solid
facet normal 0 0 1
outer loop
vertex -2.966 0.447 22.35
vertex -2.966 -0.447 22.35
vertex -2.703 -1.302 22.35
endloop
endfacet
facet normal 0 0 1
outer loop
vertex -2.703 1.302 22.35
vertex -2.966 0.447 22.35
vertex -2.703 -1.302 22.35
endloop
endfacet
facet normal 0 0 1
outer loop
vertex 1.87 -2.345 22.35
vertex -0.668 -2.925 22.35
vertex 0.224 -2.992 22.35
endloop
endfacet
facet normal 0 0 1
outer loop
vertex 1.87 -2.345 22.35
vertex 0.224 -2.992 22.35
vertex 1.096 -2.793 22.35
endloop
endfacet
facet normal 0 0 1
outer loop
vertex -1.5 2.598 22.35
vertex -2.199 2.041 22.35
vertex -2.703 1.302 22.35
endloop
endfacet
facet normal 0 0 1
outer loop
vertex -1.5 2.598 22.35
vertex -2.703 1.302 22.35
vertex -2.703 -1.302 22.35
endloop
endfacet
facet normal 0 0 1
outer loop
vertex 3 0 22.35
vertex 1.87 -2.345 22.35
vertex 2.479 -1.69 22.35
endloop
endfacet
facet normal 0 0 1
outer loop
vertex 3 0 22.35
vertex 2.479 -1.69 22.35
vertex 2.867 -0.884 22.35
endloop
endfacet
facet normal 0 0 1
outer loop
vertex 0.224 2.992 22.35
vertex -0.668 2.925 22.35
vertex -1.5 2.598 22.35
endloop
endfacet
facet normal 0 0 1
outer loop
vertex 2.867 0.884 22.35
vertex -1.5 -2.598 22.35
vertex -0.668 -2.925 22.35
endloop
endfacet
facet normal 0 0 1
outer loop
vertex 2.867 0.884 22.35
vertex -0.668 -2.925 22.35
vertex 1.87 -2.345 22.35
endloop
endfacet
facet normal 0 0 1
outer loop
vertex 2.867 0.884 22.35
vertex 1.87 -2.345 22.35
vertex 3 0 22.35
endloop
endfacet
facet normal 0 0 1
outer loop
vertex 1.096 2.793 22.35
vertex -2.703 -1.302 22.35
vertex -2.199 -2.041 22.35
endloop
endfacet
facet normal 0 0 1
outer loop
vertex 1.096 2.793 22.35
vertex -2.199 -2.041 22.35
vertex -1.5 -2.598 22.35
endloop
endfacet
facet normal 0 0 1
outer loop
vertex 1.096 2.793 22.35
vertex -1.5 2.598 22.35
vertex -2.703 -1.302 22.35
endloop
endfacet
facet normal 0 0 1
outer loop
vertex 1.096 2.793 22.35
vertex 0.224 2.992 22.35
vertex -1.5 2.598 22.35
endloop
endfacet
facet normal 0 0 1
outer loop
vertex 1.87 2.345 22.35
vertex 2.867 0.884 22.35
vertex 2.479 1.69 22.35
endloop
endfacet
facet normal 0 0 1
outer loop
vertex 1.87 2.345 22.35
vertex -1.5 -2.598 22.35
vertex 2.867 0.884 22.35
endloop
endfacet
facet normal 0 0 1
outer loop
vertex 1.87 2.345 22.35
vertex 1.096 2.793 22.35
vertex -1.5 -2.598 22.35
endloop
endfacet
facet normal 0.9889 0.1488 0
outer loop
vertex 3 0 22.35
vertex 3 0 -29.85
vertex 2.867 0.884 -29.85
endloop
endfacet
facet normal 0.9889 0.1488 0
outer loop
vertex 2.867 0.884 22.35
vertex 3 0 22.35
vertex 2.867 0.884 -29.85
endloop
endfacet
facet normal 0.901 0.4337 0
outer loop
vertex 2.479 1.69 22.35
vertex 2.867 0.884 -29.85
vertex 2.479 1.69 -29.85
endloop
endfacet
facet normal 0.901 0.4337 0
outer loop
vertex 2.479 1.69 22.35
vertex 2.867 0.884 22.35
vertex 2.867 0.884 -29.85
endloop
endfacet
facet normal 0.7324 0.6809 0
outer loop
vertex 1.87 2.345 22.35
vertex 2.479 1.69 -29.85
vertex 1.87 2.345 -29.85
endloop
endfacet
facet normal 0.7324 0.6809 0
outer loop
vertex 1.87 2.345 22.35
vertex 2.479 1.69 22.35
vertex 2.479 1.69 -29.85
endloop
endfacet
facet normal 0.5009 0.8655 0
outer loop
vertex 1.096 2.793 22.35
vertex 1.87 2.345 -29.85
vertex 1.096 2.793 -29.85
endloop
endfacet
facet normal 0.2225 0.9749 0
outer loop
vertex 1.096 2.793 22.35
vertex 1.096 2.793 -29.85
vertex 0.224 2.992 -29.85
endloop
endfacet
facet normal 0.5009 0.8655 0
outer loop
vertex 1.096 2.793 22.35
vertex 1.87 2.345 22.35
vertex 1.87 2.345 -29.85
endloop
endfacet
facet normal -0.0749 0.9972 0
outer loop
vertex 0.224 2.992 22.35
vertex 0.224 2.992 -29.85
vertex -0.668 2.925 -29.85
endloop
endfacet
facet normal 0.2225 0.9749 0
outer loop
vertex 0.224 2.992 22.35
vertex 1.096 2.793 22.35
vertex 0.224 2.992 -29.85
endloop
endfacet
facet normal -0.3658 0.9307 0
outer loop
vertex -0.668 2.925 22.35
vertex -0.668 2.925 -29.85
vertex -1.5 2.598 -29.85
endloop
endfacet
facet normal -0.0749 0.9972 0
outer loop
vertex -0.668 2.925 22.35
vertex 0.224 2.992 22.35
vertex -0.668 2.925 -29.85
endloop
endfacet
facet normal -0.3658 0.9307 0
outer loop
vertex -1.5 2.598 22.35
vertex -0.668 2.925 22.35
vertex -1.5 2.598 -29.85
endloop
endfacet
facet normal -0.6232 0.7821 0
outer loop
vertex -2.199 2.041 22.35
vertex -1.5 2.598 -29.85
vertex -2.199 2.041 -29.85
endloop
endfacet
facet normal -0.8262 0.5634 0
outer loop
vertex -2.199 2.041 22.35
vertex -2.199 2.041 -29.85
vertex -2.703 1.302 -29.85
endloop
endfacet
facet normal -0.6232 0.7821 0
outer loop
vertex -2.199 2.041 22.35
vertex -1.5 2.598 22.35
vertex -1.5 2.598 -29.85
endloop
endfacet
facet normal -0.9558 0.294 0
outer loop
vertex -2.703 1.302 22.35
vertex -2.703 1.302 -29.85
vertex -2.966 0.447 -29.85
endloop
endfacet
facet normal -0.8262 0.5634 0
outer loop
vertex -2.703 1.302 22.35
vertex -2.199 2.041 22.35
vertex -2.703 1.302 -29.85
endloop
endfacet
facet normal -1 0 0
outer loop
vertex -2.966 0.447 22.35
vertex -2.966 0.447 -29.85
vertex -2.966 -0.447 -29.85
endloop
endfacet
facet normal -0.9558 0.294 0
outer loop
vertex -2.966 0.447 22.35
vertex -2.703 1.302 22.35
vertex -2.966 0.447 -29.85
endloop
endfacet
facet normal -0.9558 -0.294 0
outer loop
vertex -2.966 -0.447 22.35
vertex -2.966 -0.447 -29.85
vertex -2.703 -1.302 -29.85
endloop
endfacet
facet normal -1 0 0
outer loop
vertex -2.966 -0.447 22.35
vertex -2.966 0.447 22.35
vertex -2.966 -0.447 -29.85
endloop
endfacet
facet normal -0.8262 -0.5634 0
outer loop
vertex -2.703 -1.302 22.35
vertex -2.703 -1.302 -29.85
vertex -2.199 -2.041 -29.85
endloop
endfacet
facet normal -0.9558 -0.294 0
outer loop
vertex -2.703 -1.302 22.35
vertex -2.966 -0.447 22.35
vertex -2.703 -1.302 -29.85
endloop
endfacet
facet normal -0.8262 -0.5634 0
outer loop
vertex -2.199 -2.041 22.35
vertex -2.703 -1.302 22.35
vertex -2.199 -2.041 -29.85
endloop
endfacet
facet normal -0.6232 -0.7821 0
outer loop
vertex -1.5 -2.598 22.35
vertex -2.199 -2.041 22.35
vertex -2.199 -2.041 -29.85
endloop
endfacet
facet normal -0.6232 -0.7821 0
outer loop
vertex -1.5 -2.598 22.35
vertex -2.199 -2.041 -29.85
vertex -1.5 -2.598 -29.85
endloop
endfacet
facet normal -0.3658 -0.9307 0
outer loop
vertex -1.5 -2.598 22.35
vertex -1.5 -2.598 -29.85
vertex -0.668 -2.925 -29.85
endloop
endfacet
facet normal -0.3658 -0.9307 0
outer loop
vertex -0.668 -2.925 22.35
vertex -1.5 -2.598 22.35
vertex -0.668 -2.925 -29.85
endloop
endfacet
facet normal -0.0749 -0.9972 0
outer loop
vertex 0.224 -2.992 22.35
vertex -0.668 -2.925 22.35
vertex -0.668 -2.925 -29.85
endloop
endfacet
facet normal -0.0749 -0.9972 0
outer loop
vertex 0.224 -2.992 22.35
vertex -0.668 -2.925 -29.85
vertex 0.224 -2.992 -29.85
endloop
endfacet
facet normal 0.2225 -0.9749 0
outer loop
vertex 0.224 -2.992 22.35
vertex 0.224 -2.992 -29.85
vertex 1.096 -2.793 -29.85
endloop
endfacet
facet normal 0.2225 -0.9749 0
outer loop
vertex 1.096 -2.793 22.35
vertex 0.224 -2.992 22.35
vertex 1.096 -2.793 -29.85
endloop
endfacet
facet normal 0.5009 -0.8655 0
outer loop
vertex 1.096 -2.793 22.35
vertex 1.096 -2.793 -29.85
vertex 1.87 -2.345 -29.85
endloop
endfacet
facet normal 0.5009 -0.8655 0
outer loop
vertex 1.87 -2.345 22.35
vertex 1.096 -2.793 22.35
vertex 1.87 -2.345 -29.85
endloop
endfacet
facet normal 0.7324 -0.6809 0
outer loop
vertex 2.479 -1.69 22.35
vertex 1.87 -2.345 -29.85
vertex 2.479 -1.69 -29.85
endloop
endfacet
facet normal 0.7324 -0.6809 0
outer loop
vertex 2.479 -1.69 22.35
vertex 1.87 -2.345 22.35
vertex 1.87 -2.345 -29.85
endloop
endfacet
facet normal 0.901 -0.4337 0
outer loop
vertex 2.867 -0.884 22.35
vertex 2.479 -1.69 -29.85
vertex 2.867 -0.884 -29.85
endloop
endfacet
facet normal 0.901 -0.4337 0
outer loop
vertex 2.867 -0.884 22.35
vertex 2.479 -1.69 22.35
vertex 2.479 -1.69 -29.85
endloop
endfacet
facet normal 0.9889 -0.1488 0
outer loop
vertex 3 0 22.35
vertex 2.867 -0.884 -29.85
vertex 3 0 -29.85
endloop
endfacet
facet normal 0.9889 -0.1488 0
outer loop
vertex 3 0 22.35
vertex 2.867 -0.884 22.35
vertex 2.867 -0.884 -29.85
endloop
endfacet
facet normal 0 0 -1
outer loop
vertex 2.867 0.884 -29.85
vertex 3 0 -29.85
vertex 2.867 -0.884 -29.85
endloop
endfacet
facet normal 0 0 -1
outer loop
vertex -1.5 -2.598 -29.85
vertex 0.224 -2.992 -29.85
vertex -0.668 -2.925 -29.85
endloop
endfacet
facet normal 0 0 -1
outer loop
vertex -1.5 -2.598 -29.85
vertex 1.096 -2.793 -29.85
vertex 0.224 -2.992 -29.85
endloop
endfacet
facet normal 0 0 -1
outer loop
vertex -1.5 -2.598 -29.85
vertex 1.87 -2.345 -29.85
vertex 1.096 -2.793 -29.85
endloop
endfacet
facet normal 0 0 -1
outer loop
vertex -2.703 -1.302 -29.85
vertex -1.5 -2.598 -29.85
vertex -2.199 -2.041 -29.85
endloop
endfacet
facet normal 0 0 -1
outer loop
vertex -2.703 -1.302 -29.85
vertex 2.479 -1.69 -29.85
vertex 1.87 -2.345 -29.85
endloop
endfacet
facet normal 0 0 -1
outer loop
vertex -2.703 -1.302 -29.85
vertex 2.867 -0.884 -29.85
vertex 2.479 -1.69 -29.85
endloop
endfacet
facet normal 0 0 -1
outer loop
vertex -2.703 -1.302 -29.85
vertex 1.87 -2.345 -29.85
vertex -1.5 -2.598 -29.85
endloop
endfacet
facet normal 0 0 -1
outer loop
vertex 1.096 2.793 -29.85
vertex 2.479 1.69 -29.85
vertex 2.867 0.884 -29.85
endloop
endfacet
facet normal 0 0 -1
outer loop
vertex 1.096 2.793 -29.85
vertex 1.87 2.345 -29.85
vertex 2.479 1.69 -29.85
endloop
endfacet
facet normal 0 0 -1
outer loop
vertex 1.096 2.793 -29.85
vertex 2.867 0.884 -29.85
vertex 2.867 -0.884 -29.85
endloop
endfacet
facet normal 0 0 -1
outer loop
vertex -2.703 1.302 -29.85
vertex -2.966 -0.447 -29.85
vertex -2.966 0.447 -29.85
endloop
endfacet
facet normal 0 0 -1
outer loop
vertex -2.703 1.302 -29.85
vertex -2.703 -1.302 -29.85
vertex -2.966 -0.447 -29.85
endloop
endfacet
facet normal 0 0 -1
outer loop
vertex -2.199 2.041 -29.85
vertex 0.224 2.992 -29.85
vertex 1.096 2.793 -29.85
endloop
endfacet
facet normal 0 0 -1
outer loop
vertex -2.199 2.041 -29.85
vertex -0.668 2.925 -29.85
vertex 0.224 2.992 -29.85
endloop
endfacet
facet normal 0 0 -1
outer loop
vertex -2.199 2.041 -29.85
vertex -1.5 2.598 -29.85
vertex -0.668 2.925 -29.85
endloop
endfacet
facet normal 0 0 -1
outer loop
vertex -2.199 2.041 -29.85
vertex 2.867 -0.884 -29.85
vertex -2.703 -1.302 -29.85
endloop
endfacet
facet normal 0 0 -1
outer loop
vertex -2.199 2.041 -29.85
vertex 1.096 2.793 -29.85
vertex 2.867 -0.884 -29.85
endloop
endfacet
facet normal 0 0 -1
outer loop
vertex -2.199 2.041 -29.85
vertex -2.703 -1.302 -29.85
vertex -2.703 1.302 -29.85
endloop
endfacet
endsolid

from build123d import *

# Parameters (mm, degrees)
SKETCH1_R           = 3
BOSS_EXTRUDE1_DEPTH = 50
CUT_EXTRUDE1_START  = -27.65
SKETCH2_R           = 3
CUT_EXTRUDE1_DEPTH  = 27.65
CUT_EXTRUDE2_START  = -20.15
SKETCH3_R           = 3
CUT_EXTRUDE2_DEPTH  = 20.15


with BuildPart() as part:
    # Sketch1 → Boss-Extrude1 (new, symmetric)
    with BuildSketch(Plane.XY):
        Circle(SKETCH1_R)
    extrude(amount=BOSS_EXTRUDE1_DEPTH, both=True)

    # Sketch2 → Cut-Extrude1 (cut)
    with BuildSketch(Plane.XY.offset(50).offset(CUT_EXTRUDE1_START)):
        Circle(SKETCH2_R)
    extrude(amount=CUT_EXTRUDE1_DEPTH, mode=Mode.SUBTRACT)

    # Sketch3 → Cut-Extrude2 (cut)
    with BuildSketch(Plane(origin=(0, 0, -50), x_dir=(-1, 0, 0), z_dir=(0, 0, -1)).offset(CUT_EXTRUDE2_START)):
        Circle(SKETCH3_R)
    extrude(amount=CUT_EXTRUDE2_DEPTH, mode=Mode.SUBTRACT)


solid = part.part
